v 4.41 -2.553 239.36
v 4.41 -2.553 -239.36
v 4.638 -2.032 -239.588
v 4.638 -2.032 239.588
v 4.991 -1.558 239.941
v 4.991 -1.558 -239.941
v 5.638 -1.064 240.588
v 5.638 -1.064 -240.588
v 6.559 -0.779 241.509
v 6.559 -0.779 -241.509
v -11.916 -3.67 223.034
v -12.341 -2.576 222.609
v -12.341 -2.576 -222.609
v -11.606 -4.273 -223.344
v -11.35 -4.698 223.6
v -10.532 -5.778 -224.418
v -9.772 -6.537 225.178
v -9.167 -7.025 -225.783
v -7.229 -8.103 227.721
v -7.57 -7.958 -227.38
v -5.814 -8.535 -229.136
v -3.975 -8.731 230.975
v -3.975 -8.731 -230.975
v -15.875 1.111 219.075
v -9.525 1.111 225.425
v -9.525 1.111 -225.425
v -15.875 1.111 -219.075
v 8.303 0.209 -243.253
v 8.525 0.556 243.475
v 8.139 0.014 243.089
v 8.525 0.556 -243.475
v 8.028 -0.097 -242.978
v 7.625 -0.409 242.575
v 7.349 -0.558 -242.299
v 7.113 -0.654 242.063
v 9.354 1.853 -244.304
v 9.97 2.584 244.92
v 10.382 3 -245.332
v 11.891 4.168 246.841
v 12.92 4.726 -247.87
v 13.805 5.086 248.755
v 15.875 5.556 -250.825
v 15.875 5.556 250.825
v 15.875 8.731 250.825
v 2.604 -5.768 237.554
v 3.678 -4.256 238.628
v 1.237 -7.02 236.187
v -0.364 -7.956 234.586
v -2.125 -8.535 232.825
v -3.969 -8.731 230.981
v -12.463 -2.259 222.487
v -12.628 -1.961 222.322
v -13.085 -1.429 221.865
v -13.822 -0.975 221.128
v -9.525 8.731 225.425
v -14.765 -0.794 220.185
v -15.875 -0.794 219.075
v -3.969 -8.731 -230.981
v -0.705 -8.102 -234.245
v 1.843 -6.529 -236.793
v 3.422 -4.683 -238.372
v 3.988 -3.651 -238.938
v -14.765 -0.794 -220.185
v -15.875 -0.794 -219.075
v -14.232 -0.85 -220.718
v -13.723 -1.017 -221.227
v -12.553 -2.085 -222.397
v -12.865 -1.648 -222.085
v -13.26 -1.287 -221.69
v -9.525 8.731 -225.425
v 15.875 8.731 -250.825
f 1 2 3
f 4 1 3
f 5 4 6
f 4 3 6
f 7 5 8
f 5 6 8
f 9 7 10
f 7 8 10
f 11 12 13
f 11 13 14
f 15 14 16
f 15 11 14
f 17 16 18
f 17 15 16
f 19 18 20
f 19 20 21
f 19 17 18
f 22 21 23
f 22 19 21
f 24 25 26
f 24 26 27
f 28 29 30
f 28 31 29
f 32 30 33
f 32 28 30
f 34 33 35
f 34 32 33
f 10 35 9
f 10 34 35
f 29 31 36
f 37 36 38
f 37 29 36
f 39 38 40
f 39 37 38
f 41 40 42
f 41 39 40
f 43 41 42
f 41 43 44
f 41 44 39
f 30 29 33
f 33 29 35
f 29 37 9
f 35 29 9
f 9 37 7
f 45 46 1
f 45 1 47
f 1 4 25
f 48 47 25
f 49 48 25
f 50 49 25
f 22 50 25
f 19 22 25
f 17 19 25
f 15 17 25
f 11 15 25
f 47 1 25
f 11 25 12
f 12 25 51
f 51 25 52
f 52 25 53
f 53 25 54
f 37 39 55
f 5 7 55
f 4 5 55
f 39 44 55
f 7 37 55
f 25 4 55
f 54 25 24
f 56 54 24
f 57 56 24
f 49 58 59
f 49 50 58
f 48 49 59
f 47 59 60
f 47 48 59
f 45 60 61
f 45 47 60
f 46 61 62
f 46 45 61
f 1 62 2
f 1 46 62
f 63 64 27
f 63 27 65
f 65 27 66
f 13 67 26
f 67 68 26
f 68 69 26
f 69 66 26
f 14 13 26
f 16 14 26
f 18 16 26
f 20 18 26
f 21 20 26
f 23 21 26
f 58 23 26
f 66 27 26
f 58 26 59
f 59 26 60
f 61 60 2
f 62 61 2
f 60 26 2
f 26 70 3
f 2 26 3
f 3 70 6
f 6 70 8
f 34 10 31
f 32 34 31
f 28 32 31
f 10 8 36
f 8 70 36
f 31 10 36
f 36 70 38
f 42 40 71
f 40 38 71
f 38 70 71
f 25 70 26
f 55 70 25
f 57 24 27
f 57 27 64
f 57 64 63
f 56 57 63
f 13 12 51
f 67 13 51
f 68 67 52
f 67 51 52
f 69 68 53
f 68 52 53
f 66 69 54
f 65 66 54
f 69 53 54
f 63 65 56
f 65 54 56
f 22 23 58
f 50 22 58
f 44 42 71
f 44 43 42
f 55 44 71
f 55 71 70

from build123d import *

# Parameters (mm, degrees)
F1_DEPTH = 250.825
F2_R     = 2.54
F3_R     = 2.54
F4_R     = 2.54
F6_W     = 6.35
F6_H     = 501.65
F7_DEPTH = 7.62
F8_DEPTH = 17.4635001


# Not quite as in the source:
# - ends of sketch curves that miss each other by under 0.0002 mm in the source are joined


with BuildPart() as f1:
    # F0 (on Top) → F1 (new body, symmetric)
    with BuildSketch(Plane.XY):
        with BuildLine():
            Line((15.875, 5.55625), (15.875, 8.73125))
            Line((15.875, 8.73125), (-15.875, 8.73125))
            Line((-15.875, 8.73125), (-15.875, -0.79375))
            Line((-15.875, -0.79375), (-12.7, -0.79375))
            ThreePointArc((-12.7, -0.79375), (-9.8710707302, -6.4481459867), (-3.9751, -8.73125))
            Line((-3.9751, -8.73125), (-3.96875, -8.73125))
            ThreePointArc((-3.96875, -8.73125), (1.9312218072, -6.4502821485), (4.7625, -0.79375))
            Line((4.7625, -0.79375), (7.9375, -0.79375))
            ThreePointArc((7.9375, -0.79375), (10.9883747468, 3.5285940665), (15.875, 5.55625))
        make_face()
    extrude(amount=F1_DEPTH, both=True)

    # F2
    f2_edges = [f1.edges().sort_by_distance(p)[0] for p in [
        (7.9375, -0.79375, 0),
    ]]
    fillet(f2_edges, radius=F2_R)

    # F3
    f3_edges = [f1.edges().sort_by_distance(p)[0] for p in [
        (-12.7, -0.79375, 0),
    ]]
    fillet(f3_edges, radius=F3_R)

    # F4
    f4_edges = [f1.edges().sort_by_distance(p)[0] for p in [
        (4.7625, -0.79375, 0),
    ]]
    fillet(f4_edges, radius=F4_R)

    # F6 (on face) → F7 (cut)
    with BuildSketch(Plane(origin=(0, 8.73125, 0), x_dir=(-1, 0, 0), z_dir=(0, 1, 0))):
        with Locations((12.7, 0)):
            Rectangle(F6_W, F6_H)
    extrude(amount=-F7_DEPTH, mode=Mode.SUBTRACT)

    # F5 (on face) → F8 (cut, through all)
    with BuildSketch(Plane(origin=(0, 8.73125, 0), x_dir=(-1, 0, 0), z_dir=(0, 1, 0))):
        Polygon((15.875, -250.825), (15.875, -219.075), (-15.875, -250.825), align=None)
        Polygon((-15.875, 250.825), (15.875, 219.075), (15.875, 250.825), align=None)
    extrude(amount=-F8_DEPTH, mode=Mode.SUBTRACT)


solid = f1.part
